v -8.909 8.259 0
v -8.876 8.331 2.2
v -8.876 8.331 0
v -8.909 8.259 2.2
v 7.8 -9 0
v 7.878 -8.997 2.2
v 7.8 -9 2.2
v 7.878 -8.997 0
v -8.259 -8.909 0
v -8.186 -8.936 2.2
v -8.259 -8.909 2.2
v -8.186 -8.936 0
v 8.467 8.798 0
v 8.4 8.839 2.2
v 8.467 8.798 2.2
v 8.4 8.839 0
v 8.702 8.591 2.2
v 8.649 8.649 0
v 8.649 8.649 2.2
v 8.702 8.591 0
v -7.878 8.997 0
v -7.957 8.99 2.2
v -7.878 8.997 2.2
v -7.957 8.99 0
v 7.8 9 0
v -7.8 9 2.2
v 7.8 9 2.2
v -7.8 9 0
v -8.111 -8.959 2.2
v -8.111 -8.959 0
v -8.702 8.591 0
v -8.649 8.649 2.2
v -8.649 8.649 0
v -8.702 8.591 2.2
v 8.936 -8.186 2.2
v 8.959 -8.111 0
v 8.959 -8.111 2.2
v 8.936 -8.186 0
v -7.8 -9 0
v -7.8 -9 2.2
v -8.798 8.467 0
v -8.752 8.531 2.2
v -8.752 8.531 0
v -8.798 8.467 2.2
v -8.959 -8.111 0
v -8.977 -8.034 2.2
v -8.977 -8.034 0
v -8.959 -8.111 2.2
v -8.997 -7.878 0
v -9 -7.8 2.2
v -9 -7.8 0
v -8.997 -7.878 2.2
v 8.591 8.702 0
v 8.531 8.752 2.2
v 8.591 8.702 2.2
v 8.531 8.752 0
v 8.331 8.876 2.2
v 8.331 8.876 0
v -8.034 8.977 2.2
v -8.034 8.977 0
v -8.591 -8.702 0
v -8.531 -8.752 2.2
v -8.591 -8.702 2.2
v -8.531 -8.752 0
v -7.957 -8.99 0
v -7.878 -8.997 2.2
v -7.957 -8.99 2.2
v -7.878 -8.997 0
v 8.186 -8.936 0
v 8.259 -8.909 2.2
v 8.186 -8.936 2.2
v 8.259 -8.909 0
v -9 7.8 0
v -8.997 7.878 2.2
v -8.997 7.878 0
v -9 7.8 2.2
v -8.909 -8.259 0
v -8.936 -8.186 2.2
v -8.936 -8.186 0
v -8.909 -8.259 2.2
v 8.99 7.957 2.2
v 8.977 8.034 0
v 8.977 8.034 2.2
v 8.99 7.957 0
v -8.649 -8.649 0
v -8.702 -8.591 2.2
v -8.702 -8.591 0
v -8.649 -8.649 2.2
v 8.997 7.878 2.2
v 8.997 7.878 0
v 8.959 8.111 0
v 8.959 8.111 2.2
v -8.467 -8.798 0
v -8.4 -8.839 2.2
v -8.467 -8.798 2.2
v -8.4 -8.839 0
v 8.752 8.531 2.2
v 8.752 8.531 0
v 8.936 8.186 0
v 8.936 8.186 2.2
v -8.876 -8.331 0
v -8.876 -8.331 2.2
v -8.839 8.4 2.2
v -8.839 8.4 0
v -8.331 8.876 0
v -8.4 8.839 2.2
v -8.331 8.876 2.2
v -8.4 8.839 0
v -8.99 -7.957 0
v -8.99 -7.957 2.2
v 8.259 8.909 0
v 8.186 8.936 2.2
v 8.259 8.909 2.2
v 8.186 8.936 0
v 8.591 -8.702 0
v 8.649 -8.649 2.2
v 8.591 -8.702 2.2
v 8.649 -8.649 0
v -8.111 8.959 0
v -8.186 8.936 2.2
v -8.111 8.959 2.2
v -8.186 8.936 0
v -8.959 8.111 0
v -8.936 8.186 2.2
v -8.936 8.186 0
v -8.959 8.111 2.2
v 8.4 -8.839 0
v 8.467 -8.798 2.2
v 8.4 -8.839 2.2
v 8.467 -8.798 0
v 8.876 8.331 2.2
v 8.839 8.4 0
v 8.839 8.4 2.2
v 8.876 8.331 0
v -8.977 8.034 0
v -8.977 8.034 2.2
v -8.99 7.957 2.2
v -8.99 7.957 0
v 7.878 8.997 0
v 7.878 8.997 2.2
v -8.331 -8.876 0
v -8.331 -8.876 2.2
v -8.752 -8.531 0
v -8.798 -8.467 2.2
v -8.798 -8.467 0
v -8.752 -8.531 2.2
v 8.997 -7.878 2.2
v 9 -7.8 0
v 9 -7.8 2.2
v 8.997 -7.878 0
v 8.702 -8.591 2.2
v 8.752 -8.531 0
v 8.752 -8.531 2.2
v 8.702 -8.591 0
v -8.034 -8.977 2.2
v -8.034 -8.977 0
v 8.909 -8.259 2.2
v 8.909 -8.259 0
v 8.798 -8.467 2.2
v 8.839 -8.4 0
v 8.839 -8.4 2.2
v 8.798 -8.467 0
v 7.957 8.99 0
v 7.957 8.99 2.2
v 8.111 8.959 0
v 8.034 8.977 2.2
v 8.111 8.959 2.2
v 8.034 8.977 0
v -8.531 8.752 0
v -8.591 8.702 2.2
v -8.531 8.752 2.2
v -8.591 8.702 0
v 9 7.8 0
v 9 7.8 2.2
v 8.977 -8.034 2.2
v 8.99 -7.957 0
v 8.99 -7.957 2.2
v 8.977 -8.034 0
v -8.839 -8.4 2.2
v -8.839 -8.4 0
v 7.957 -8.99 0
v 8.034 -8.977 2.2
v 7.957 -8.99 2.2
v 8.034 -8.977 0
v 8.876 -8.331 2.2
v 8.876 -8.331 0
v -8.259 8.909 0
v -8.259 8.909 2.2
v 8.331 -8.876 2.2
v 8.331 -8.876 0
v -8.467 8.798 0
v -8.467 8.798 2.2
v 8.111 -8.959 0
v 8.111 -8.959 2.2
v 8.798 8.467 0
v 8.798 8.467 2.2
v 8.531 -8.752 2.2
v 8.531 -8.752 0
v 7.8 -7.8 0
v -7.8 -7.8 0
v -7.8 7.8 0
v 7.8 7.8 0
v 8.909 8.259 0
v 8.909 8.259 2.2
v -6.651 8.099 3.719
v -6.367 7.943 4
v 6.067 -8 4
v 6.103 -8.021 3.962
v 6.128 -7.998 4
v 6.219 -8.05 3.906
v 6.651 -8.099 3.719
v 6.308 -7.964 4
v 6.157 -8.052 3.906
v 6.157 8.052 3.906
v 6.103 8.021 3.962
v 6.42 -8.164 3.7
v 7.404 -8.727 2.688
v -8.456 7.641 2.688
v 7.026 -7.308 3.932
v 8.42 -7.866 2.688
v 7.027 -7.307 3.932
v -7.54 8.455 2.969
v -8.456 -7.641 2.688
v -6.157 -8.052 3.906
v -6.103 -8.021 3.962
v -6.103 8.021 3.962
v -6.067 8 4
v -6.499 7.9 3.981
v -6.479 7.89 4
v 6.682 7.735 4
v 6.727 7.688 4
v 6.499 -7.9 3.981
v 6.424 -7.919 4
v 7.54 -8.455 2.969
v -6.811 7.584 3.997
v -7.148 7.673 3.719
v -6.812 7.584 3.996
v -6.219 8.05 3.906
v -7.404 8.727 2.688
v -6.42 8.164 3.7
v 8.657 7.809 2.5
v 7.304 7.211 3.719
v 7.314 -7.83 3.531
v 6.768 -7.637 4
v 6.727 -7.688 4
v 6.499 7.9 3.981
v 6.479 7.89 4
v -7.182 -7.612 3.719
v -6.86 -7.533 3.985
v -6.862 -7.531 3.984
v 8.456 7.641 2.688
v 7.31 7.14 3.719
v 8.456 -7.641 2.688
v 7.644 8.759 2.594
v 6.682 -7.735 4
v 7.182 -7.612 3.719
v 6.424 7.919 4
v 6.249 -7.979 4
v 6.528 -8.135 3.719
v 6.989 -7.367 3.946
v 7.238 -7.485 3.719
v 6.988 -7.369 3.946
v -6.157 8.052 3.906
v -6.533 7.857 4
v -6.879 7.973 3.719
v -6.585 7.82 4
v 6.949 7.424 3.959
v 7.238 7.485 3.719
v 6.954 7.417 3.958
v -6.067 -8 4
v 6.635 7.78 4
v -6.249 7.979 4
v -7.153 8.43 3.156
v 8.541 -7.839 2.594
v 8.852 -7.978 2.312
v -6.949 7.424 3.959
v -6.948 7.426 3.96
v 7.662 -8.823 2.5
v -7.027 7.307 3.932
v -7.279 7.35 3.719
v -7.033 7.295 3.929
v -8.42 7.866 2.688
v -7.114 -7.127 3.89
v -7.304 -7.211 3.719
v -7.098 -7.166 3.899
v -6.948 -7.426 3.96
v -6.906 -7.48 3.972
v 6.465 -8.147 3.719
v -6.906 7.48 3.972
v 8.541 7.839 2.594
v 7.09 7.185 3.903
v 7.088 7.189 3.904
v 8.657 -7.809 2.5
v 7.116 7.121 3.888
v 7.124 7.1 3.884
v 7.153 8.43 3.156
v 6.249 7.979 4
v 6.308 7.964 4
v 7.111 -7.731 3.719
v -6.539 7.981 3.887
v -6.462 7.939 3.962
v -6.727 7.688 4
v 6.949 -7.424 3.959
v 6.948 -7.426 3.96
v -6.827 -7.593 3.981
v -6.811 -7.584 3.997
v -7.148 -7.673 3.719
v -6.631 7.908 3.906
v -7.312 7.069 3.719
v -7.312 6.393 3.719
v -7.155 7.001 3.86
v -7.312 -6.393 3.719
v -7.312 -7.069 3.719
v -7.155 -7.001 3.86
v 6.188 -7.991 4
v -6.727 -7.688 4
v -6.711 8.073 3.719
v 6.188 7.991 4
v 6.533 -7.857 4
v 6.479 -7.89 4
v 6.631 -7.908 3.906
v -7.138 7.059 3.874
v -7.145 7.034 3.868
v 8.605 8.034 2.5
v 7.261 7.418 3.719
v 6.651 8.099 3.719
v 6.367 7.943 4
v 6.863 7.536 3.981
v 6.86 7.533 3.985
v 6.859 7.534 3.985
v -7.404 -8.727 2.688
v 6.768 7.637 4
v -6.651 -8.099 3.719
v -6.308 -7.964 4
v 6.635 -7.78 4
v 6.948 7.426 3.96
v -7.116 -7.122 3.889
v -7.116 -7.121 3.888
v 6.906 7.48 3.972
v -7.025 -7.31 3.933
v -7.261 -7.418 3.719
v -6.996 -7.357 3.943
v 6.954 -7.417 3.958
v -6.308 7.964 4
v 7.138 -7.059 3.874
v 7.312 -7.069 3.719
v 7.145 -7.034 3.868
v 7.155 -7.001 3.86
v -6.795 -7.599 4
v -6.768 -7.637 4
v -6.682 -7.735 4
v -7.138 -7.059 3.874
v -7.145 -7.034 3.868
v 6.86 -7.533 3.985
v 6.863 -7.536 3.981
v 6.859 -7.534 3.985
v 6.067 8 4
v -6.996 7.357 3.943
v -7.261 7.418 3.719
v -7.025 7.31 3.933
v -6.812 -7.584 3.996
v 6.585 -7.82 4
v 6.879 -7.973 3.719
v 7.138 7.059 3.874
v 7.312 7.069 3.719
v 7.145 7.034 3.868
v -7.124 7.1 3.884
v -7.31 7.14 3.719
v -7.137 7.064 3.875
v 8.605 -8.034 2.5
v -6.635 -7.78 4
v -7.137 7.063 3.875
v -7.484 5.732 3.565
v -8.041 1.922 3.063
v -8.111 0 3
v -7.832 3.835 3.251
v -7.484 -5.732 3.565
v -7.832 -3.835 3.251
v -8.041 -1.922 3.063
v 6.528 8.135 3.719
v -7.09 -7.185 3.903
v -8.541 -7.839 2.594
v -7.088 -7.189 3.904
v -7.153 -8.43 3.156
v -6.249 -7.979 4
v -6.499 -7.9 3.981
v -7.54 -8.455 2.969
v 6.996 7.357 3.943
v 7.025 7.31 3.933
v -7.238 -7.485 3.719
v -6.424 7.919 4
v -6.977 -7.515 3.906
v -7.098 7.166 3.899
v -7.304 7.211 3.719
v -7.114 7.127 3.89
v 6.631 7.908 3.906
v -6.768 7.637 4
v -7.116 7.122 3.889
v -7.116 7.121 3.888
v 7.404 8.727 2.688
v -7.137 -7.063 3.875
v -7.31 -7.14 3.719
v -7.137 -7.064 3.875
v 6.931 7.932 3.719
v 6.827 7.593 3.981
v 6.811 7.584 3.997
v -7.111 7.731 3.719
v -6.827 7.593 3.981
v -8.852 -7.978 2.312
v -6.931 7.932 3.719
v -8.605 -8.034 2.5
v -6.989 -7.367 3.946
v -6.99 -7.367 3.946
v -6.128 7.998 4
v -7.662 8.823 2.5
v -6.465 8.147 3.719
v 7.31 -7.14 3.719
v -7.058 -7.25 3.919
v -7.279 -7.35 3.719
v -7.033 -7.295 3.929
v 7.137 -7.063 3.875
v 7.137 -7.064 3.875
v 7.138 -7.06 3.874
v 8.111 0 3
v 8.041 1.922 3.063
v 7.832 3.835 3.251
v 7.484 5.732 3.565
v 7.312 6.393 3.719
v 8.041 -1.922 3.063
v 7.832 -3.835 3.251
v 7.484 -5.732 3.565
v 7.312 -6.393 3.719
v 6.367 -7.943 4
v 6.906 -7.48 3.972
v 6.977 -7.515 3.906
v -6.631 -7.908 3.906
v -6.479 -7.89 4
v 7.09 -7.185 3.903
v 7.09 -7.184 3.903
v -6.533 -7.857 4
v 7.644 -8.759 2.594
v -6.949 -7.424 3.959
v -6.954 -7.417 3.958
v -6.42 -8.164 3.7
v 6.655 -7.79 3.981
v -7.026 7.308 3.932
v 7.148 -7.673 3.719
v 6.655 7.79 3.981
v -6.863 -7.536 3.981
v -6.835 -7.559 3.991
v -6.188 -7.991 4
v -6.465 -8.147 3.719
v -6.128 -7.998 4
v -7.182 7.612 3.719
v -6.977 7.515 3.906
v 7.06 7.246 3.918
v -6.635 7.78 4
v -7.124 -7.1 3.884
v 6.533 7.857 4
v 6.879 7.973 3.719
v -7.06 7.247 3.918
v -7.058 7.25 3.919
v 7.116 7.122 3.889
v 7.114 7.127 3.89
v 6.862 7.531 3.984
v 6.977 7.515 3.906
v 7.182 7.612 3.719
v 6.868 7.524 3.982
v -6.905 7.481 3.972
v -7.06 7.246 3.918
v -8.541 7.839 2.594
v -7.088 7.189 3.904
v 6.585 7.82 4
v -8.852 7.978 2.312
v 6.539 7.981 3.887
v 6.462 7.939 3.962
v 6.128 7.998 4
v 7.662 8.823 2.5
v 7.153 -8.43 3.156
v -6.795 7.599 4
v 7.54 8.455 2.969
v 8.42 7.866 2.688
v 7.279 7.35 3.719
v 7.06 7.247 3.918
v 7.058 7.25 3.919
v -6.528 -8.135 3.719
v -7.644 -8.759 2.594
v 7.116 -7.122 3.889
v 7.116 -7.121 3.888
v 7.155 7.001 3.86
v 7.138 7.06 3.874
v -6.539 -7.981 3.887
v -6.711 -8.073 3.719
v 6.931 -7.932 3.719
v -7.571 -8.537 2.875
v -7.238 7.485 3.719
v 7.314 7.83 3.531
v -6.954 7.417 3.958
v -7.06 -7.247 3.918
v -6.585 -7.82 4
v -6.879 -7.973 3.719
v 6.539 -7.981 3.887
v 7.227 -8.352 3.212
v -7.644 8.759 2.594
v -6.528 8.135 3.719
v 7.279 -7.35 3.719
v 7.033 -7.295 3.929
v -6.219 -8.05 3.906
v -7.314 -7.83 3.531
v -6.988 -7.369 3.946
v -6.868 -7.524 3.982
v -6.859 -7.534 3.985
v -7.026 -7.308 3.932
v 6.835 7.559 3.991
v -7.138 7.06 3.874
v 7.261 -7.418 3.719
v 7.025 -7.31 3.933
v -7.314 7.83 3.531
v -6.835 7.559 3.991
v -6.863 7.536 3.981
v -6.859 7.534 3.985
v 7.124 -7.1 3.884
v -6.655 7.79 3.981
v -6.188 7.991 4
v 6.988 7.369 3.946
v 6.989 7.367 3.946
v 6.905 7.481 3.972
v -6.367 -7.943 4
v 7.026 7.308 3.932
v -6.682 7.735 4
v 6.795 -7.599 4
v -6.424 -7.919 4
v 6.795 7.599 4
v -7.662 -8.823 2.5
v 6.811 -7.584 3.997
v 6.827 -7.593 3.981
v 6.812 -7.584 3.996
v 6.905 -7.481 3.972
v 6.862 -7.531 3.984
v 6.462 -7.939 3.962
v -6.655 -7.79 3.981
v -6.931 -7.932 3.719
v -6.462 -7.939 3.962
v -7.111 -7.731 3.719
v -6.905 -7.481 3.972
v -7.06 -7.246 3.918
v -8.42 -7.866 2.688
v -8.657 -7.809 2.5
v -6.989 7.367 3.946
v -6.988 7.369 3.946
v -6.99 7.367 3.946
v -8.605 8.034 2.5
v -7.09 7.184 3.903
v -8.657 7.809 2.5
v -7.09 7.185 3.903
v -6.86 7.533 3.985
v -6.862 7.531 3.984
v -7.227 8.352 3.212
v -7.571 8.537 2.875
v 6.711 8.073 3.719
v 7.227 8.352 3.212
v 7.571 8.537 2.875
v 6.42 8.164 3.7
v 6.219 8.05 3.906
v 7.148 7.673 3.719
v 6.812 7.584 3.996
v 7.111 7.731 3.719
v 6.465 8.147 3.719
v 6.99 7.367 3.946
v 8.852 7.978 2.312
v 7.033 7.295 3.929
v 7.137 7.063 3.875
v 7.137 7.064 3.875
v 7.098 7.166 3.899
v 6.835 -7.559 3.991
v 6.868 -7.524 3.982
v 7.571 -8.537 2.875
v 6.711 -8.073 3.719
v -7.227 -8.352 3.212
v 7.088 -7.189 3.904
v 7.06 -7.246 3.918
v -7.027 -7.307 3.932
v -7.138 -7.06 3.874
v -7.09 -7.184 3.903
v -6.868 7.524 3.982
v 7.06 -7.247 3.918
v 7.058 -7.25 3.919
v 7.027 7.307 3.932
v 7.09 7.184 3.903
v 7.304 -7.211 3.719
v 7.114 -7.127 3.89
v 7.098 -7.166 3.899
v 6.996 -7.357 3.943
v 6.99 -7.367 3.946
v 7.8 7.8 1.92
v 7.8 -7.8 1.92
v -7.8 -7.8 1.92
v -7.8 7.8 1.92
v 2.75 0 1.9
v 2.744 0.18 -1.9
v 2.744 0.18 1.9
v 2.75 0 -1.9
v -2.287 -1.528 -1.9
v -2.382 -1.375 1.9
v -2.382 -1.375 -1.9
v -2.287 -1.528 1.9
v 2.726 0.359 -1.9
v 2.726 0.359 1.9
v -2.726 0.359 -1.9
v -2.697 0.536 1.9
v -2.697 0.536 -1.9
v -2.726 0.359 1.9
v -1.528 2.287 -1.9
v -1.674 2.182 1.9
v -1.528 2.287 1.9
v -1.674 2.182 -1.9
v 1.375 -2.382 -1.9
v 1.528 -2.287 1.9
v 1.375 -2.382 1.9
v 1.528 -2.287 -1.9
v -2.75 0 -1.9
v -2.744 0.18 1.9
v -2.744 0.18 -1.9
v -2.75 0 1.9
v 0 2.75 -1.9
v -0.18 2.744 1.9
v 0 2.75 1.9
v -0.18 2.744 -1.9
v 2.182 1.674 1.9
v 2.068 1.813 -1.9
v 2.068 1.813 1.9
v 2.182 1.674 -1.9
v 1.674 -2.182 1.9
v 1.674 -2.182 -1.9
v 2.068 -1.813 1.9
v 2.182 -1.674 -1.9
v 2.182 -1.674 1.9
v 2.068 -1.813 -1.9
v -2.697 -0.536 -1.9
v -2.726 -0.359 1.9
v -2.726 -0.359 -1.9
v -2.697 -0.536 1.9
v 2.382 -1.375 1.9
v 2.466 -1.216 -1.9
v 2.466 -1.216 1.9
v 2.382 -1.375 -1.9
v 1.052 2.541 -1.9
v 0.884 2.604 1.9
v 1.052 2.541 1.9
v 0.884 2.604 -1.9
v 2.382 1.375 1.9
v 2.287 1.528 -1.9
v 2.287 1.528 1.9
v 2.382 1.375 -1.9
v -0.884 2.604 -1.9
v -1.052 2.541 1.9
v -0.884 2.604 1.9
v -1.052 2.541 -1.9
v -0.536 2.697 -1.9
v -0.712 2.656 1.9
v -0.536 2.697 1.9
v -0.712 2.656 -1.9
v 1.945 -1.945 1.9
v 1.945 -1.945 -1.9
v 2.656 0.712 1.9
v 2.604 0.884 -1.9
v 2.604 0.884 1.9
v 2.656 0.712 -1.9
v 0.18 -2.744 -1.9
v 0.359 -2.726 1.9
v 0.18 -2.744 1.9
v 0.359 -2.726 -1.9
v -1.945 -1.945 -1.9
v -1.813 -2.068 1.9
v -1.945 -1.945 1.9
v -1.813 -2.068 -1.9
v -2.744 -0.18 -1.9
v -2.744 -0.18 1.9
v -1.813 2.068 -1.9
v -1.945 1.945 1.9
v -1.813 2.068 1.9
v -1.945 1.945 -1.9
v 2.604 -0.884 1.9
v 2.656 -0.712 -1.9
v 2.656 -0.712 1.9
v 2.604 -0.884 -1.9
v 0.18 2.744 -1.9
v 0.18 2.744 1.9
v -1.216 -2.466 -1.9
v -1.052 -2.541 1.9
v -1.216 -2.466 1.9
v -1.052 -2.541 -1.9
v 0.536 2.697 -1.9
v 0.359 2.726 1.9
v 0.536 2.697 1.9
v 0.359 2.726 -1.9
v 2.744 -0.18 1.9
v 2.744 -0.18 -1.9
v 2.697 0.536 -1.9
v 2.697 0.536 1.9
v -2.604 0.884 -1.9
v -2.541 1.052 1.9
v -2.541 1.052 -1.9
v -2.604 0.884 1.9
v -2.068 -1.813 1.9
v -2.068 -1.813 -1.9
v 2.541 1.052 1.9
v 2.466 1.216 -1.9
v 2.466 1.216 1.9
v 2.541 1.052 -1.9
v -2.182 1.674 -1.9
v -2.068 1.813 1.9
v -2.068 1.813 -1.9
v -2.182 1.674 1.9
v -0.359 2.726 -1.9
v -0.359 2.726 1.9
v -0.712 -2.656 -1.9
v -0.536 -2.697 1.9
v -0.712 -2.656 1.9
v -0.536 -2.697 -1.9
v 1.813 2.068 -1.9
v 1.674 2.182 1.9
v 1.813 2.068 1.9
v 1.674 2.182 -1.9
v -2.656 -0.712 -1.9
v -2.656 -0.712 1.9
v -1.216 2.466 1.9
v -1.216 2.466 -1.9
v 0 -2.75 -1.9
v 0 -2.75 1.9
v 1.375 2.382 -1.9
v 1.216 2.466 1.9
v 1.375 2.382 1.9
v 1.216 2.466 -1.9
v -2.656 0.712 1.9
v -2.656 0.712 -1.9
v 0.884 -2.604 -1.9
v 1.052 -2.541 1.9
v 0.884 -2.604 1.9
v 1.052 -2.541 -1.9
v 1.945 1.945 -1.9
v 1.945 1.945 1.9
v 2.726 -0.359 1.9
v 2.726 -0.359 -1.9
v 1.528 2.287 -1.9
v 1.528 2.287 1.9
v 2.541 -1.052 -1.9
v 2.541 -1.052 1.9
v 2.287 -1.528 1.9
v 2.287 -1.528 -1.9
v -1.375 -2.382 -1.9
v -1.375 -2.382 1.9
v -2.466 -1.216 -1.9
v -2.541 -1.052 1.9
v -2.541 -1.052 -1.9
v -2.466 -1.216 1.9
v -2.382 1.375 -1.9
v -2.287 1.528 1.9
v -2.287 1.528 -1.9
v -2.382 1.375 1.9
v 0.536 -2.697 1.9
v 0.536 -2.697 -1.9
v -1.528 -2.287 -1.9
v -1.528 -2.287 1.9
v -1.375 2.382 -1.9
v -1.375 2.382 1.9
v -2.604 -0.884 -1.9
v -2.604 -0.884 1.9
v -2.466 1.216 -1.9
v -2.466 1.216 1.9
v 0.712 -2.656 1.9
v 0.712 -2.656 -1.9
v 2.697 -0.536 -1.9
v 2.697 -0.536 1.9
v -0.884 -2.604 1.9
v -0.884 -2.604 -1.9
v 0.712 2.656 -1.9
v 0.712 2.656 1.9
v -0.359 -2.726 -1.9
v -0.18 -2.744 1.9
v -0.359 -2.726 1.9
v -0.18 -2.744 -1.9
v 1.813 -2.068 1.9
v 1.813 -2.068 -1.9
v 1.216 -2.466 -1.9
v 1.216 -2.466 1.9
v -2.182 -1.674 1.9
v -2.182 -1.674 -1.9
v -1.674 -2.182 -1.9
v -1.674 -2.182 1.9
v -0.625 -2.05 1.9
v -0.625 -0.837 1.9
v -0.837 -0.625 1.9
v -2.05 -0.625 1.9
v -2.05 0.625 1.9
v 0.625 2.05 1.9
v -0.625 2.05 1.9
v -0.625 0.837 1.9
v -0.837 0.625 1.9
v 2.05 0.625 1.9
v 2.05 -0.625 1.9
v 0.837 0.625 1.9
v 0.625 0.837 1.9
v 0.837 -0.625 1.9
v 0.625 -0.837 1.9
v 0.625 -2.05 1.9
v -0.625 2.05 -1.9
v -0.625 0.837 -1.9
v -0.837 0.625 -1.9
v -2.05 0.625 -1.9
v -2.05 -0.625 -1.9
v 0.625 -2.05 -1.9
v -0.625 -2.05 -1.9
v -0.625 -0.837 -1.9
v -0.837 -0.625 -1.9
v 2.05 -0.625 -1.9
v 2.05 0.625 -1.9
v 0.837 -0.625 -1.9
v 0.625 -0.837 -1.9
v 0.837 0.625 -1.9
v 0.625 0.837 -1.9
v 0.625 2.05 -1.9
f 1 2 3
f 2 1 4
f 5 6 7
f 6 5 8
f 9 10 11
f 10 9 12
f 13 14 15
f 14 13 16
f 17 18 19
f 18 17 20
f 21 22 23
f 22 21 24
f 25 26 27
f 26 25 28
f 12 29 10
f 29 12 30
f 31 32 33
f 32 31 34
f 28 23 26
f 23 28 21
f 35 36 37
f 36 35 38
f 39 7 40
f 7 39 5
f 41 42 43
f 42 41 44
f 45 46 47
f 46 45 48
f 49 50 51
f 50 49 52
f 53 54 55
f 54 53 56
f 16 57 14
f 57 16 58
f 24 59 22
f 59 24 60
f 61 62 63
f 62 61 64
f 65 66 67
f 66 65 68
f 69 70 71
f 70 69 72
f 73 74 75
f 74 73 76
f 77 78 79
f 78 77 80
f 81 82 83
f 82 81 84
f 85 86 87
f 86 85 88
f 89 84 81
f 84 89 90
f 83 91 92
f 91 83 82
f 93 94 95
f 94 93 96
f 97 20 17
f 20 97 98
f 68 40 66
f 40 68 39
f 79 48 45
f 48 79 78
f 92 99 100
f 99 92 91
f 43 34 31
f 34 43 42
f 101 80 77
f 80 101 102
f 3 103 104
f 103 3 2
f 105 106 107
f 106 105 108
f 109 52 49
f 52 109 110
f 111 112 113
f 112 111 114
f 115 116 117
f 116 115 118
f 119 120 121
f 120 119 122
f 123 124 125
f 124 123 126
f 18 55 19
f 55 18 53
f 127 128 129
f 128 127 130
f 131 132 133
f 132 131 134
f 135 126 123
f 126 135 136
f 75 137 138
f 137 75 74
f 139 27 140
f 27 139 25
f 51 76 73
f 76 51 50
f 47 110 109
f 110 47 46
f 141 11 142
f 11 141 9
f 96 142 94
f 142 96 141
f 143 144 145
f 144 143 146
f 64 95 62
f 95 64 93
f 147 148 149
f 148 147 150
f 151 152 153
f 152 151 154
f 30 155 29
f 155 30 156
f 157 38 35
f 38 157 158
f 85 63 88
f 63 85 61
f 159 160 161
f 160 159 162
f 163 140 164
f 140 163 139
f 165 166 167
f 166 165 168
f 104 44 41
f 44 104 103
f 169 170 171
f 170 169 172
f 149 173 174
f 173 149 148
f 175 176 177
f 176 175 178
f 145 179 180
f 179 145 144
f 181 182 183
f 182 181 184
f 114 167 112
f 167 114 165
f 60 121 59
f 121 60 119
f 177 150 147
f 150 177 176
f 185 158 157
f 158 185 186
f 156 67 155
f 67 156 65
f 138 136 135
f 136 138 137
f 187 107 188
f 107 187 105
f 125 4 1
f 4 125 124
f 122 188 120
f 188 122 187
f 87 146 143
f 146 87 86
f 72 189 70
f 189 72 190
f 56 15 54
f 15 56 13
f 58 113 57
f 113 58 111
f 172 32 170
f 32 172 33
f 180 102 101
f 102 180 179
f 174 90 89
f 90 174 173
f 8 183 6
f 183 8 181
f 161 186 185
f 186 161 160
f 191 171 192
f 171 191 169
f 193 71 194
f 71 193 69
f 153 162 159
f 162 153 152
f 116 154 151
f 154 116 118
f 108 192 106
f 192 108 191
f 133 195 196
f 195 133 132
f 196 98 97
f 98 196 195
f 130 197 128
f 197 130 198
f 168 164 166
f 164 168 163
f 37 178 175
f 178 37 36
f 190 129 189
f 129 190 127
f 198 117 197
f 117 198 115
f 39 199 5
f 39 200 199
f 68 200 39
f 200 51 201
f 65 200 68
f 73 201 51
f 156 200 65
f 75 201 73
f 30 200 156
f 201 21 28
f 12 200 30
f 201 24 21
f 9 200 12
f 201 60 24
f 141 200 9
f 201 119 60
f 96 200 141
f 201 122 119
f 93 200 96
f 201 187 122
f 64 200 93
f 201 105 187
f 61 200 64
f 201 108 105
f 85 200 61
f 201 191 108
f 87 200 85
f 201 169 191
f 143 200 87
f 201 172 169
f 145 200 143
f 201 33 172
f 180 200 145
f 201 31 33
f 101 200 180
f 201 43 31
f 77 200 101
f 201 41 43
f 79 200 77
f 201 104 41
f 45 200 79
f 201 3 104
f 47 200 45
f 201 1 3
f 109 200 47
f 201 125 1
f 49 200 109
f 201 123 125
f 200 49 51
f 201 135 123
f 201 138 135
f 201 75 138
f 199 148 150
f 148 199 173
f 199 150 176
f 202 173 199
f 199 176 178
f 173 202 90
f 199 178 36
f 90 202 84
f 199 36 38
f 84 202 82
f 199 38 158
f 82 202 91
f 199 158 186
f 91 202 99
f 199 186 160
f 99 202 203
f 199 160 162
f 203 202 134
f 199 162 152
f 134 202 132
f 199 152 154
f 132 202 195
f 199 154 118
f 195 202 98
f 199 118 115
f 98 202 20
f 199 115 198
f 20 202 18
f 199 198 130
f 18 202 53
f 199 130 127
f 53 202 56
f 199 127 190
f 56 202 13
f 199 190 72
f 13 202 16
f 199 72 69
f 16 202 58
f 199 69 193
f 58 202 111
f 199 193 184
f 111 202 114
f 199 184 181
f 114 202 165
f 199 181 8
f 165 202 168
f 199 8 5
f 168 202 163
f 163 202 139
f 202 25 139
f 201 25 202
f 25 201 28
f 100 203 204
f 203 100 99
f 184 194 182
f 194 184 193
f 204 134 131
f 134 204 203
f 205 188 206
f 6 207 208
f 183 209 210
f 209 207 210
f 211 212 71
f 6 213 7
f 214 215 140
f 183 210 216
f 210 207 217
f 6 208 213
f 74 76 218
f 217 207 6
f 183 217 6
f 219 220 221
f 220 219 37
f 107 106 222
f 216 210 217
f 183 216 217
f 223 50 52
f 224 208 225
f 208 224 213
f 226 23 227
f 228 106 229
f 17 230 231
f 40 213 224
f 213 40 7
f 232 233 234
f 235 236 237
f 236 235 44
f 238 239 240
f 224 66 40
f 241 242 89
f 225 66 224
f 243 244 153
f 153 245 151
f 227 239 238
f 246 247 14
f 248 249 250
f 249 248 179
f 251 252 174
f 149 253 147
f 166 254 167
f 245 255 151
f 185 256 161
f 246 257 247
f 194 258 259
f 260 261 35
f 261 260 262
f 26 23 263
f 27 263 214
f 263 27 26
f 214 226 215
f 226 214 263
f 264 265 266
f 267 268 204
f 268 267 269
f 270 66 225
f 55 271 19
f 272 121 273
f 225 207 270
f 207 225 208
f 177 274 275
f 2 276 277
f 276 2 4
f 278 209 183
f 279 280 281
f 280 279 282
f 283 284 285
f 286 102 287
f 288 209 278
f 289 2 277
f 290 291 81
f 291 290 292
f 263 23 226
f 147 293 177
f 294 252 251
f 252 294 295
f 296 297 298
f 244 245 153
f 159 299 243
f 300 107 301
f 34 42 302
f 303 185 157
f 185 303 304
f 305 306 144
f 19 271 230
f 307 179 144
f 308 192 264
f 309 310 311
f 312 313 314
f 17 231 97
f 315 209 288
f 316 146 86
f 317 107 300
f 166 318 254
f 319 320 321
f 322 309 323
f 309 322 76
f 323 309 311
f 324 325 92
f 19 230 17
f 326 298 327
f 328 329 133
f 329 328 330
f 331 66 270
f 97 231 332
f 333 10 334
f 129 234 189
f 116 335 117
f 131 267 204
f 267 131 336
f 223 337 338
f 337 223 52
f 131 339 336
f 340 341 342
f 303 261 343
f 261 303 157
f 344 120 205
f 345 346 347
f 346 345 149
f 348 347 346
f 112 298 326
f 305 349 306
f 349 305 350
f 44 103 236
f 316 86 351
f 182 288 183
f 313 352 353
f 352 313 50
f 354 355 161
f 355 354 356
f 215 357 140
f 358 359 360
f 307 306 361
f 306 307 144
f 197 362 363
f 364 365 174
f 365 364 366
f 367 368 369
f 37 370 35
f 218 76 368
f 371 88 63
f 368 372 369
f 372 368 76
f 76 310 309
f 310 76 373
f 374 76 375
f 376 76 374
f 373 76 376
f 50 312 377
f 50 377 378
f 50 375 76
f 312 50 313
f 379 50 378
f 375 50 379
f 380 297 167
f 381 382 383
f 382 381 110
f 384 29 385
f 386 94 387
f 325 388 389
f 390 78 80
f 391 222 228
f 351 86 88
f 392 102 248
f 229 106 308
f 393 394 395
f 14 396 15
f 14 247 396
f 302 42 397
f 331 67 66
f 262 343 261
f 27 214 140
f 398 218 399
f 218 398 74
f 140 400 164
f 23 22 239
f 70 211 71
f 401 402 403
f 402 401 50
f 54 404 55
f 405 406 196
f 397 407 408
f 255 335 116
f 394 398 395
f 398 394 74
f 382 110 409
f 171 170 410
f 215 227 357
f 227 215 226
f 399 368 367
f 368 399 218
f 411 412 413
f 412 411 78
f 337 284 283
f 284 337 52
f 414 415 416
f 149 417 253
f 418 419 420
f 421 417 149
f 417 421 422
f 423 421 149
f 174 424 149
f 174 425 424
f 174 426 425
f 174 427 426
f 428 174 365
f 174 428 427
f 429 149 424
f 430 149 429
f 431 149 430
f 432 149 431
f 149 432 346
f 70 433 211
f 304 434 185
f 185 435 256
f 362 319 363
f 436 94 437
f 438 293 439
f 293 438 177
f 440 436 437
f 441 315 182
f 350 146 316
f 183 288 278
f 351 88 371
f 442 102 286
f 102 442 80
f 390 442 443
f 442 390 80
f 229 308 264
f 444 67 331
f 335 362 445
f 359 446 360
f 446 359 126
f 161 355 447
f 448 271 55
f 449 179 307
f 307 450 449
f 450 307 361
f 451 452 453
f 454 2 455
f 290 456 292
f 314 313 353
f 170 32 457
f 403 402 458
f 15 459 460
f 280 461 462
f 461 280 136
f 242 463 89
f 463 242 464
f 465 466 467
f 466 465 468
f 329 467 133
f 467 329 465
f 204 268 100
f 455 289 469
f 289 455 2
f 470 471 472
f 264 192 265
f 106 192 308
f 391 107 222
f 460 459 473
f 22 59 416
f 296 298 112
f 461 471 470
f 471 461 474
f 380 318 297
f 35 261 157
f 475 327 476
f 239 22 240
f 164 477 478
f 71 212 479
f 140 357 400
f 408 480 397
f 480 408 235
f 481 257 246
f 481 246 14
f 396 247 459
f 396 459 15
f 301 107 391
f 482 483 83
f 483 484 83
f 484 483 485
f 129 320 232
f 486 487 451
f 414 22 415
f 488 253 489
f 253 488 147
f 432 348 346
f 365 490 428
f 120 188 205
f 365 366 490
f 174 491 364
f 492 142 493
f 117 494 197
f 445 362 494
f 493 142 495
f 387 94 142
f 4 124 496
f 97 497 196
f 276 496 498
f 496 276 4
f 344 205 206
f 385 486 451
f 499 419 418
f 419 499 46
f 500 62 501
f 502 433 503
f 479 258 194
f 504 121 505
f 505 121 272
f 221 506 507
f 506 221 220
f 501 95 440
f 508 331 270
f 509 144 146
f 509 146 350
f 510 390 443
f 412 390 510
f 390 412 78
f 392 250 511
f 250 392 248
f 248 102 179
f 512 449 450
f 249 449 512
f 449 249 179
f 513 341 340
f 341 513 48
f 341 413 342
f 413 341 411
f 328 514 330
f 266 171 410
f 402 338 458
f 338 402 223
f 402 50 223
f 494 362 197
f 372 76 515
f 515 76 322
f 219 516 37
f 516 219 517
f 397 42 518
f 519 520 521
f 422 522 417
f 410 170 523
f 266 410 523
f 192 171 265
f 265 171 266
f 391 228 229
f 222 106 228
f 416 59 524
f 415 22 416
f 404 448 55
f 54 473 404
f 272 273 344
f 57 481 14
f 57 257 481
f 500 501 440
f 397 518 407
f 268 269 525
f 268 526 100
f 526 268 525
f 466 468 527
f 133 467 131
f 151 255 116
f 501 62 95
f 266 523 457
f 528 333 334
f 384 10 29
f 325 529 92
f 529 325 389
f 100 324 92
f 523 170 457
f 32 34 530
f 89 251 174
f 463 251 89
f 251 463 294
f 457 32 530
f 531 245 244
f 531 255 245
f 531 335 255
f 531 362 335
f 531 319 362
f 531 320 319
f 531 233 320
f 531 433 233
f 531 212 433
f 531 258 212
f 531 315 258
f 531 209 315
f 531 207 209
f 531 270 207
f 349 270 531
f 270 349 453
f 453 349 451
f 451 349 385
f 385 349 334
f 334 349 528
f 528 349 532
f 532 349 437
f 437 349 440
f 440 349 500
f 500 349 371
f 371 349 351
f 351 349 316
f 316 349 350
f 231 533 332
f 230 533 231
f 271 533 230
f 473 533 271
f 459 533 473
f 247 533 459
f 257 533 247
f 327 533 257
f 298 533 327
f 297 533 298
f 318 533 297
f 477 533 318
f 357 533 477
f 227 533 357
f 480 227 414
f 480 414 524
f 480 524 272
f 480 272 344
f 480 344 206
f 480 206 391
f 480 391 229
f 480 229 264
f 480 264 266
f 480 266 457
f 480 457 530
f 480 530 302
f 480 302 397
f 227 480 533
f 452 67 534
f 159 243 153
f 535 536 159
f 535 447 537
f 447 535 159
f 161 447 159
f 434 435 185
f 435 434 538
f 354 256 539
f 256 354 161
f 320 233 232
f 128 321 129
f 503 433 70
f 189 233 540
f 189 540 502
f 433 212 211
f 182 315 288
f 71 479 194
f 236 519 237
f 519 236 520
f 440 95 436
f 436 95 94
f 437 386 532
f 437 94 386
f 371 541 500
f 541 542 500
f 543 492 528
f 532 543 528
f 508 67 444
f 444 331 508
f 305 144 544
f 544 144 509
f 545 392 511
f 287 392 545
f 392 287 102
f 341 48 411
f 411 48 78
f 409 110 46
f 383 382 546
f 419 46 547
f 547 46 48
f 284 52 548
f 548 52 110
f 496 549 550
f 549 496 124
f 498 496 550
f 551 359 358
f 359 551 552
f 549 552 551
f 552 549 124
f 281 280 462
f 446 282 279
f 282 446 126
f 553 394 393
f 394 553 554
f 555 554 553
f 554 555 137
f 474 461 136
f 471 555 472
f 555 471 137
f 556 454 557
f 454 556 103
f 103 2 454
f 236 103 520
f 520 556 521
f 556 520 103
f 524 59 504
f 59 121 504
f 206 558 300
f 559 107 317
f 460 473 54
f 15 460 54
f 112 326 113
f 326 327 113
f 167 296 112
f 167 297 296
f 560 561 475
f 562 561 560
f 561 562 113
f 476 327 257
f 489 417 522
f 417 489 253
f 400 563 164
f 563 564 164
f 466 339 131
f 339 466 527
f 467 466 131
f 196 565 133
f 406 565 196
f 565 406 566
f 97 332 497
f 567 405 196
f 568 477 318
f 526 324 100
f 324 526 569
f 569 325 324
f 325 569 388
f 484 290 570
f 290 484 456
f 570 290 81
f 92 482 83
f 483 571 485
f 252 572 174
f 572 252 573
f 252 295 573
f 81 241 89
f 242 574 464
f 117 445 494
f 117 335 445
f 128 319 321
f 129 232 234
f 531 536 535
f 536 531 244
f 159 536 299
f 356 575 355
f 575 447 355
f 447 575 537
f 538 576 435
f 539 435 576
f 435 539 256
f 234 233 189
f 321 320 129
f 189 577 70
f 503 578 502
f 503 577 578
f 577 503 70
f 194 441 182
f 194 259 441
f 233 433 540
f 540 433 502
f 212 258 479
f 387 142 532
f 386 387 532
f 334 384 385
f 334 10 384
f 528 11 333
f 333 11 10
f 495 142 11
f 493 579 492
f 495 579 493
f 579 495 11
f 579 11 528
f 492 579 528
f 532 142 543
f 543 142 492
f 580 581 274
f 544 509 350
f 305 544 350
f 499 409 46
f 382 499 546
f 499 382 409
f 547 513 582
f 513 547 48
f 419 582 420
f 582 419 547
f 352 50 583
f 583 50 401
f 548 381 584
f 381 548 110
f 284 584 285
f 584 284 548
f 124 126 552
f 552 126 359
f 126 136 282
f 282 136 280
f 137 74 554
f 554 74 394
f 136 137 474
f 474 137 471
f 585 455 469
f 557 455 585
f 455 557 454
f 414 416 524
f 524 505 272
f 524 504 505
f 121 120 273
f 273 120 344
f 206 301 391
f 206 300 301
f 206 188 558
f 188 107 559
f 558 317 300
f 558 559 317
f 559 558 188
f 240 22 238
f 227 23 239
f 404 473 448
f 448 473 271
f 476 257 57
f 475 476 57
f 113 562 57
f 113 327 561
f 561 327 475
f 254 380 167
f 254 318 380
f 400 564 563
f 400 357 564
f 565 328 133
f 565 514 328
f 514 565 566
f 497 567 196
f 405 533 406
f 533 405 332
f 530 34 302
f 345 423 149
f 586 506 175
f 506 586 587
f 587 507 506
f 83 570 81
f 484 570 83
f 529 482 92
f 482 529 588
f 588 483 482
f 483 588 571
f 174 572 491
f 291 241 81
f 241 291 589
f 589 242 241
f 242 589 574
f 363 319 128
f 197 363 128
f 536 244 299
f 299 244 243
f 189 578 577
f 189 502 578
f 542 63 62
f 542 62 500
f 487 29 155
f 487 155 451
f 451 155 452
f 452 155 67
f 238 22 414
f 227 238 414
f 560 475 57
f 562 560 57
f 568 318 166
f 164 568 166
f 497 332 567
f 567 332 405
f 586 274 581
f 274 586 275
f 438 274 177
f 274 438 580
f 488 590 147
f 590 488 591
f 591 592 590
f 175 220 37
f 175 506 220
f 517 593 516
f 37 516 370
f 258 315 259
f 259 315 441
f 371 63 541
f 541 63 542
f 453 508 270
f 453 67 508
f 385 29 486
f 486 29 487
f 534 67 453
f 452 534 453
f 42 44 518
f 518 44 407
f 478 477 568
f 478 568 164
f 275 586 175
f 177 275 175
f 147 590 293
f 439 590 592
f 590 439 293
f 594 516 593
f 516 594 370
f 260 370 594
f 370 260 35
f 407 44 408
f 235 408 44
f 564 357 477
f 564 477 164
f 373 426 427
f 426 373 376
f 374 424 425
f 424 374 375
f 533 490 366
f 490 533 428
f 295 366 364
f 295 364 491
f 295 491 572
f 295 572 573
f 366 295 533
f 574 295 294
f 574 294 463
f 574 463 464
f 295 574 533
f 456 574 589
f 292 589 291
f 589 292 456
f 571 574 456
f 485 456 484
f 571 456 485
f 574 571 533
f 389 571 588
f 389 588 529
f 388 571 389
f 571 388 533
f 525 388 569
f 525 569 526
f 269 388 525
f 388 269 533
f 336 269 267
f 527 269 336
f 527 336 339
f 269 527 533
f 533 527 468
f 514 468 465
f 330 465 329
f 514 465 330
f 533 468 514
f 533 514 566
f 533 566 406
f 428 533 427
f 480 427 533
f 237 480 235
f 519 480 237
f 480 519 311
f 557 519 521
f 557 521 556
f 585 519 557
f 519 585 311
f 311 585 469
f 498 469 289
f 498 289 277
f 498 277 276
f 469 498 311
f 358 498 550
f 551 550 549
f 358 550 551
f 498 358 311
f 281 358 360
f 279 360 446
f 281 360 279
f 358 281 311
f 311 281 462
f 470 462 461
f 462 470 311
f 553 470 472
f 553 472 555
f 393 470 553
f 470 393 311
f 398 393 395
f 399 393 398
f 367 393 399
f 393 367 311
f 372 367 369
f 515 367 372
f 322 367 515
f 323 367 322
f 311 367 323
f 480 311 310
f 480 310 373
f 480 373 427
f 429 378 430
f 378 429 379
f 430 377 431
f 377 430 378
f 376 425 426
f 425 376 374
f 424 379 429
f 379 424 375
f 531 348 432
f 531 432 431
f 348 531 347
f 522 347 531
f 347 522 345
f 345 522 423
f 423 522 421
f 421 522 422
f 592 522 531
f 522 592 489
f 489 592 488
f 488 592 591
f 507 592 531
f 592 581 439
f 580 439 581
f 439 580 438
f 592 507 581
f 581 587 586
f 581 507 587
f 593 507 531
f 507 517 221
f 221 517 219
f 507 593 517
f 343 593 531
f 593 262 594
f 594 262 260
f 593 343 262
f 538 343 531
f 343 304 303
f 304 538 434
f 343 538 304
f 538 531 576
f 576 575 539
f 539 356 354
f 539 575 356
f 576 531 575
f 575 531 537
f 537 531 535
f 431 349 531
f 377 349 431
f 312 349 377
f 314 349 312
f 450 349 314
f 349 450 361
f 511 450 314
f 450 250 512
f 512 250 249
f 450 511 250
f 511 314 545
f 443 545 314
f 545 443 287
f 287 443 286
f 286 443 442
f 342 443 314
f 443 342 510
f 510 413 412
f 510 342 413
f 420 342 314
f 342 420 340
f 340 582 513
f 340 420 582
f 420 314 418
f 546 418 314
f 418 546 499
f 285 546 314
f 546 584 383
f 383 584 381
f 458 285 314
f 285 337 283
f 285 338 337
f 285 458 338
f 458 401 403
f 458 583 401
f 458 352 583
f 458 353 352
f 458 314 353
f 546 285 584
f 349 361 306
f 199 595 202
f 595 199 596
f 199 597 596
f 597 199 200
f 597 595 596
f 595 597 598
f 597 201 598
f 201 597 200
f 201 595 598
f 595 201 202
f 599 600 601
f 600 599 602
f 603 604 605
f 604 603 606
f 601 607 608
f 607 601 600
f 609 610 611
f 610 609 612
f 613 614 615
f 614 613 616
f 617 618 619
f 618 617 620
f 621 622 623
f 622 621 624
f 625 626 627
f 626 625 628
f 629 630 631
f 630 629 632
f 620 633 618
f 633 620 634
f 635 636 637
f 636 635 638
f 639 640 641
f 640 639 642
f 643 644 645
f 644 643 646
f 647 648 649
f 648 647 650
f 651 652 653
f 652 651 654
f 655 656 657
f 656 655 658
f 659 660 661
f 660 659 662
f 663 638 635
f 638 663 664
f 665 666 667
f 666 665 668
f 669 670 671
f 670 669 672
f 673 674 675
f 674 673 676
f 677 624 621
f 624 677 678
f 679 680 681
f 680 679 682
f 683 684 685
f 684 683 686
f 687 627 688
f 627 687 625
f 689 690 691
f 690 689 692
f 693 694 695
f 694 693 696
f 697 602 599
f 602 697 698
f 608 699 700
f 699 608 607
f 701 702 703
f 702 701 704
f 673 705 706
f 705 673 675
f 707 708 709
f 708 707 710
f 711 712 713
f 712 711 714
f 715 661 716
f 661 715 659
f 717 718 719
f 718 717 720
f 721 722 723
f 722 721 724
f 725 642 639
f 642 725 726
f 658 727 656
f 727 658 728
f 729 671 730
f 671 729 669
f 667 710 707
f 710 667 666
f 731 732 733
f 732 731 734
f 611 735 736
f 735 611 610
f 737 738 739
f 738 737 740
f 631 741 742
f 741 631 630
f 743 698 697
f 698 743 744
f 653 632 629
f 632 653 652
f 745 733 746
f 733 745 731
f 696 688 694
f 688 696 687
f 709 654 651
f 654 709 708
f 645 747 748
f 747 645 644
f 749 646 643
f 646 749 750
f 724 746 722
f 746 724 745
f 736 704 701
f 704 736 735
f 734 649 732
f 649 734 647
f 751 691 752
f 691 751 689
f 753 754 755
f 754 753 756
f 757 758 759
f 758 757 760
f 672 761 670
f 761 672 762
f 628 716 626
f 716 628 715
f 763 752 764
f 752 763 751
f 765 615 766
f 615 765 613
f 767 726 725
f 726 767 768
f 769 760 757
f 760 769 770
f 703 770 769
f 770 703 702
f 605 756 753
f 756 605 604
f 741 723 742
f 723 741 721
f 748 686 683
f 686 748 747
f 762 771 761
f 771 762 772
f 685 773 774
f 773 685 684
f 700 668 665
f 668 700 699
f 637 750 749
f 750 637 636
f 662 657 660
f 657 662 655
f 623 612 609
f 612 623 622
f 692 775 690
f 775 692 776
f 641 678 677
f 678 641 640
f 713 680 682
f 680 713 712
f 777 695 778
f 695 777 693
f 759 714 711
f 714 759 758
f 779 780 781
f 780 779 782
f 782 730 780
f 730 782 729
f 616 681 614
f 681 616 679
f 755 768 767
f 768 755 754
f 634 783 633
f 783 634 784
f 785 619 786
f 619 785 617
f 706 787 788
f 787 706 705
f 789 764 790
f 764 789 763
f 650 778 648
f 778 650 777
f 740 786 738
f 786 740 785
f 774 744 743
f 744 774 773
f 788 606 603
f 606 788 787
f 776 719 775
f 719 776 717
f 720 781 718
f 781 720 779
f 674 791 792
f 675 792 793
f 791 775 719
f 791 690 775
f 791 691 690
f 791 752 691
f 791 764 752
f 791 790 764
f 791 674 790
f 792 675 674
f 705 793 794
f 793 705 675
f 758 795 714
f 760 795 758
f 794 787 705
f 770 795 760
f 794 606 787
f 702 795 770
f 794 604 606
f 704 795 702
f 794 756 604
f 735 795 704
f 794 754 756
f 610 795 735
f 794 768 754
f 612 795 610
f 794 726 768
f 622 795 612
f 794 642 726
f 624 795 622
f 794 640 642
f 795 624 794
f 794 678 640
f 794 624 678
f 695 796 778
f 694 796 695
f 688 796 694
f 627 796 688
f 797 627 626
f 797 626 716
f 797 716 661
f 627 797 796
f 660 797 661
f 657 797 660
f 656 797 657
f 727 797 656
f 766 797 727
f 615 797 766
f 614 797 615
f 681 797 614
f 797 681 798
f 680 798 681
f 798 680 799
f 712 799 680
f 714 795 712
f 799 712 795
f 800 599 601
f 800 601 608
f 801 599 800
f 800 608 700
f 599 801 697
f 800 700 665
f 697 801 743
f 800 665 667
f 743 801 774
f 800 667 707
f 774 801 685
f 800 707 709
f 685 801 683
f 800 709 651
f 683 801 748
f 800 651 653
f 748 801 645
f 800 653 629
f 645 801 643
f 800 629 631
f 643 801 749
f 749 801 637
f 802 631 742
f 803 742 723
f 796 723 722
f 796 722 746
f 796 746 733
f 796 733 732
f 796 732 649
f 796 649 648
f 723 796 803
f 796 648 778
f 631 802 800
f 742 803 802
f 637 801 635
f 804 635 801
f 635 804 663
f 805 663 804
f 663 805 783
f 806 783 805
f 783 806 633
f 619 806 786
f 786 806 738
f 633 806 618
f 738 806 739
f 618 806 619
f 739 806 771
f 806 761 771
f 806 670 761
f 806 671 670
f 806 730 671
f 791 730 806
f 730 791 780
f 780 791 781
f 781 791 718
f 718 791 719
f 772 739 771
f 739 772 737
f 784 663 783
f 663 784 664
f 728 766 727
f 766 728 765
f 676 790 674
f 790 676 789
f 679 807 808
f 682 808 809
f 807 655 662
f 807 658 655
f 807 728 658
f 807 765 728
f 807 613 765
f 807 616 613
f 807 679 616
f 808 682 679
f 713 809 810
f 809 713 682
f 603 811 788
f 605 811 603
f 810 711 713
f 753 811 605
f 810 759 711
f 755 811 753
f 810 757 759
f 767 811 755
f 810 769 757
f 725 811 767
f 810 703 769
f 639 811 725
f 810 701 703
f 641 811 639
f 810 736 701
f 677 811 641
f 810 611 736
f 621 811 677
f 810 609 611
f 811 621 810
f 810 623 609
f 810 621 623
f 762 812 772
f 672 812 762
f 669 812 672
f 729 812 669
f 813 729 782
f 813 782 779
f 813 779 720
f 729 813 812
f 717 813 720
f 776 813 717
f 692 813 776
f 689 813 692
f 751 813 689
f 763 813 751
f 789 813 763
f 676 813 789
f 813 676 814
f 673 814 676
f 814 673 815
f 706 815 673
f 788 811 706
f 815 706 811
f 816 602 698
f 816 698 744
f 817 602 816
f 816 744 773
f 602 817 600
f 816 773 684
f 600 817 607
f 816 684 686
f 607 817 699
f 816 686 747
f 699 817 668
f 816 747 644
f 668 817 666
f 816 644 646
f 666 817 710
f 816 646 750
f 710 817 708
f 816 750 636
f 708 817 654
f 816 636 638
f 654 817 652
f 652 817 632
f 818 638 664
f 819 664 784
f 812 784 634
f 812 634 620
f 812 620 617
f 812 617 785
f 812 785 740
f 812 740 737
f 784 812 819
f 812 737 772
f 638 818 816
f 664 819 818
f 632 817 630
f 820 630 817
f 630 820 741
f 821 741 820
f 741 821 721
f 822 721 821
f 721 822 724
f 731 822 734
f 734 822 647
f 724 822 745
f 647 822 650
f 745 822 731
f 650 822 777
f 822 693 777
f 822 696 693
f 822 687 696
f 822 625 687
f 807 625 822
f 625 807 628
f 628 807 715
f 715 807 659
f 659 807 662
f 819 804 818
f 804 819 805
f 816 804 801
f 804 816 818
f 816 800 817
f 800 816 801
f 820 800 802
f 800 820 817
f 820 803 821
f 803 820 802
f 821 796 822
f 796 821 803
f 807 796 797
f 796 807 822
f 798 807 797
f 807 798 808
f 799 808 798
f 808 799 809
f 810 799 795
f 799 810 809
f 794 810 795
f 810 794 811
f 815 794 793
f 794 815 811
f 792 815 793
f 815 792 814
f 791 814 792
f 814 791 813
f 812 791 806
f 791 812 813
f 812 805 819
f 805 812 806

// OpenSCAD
/*
  Low profile Keycap for MX stems inspired by the ZSA Voyager and Taihao THTs.
  Units: mm

  This has been tested with an FDM 3D-Printer (Bambulab A1 mini) with PLA Matte.
  Requires no supports if you print with a brim and place it on one of its fillets 
  (at an angle)
  0.12mm layer-height (incl. initial layer).

  Notes / modeling choices:
  - Outer body is a two-stage extrusion: straight walls up to `side_fillet_start_z`,
    then a gentle taper toward the top “inset” footprint.
  - The “touch surface” concavity is approximated by subtracting a cylinder-shaped dish,
    with ~`dish_depth` sag at the center.
  - MX cross hole is a 2D plus that gets filleted using offset(r) then offset(-r)
*/

$fn = 96;

// -------------------------
// Parameters (grouped)
// -------------------------
/* Keycap footprint */
cap_w            = 18;     // X (use different values for oblong)
cap_h            = 18;     // Y
cap_corner_r     = 1.2;    // outer corner radius

/* Vertical dimensions */
cap_thickness        = 4.0;   // total height of cap body (cap bottom to top exterior)
wall_thickness       = 1.2;   // keycap underside cavity walls
underside_pocket_z   = 1.9;   // cavity depth from bottom (inside hollow depth)
side_fillet_start_z  = 2.2;   // z where outer “inset/taper” begins

/* Top inset / touch surface shaping */
inset_lr         = 2.0;   // inset on left/right at the very top (X border)
inset_tb_top     = 1.0;   // inset on top/bottom at the very top (Y border) (your 2mm->1mm feel)
dish_depth       = 1.0;   // concavity depth at center (approx)
dish_span_scale  = 0.95;  // how wide the dish influences (0..1), smaller = more localized

/* Stem (outer post) */
stem_outer_d     = 5.5;   // outer cylinder diameter
stem_total_len   = 3.8;   // total stem length up to the internal “roof” it attaches to
stem_protrude    = 1.9;   // how much stem sticks out below the keycap bottom (also equals pocket depth)

/* MX cross hole - these values are not to spec, but rather to print nicely. */
mx_plus_size     = 4.1;   // overall height/width of plus (across opposite ends)
mx_leg_thick     = 1.25;  // thickness of each leg
mx_inner_fillet  = 0.3;   // fillet radius for inside corners

/* Homing indicator (optional) */
enable_homing    = false;   // set true for F/J
homing_len       = 5.0;    // bar length (X)
homing_w         = 0.7;    // bar width (Y)
homing_h         = 0.5;    // bar height (Z)
homing_offset_y  = -2;     // move bump toward you (negative Y) like typical F/J
homing_offset_z  = 1.001;  // move bump into/away from the keycap

// -------------------------
// Helpers
// -------------------------
module rounded_rect_2d(w, h, r) {
  r2 = min(r, min(w,h)/2);
  offset(r=r2) square([w-2*r2, h-2*r2], center=true);
}

module mx_plus_2d(size, leg, fillet_r) {
  // Sharp plus first
  union() {
    union() {
      square([leg, size], center=true);
      square([size, leg], center=true);
    }

    // Add material only in the 4 re-entrant (inside) corners
    // (these are at ±leg/2, ±leg/2). This won’t touch the 8 outer corners.
    for (sx = [-1, 1], sy = [-1, 1]) {
      translate([sx*leg/2, sy*leg/2]) 
        rotate([0,0,45])
          square(fillet_r, center=true);
    }
  }
}


// capsule-ish bar for homing (2D), then extrude
module capsule_2d(len, w) {
  // hull of two circles to make a capsule
  hull() {
    translate([-(len/2 - w/2), 0]) circle(d=w);
    translate([ +(len/2 - w/2), 0]) circle(d=w);
  }
}

// -------------------------
// Main model
// -------------------------
module keycap_body() {
  // bottom footprint
  base_w = cap_w;
  base_h = cap_h;

  // top footprint (inset)
  top_w  = max(0.1, cap_w - 2*inset_lr);
  top_h  = max(0.1, cap_h - 2*inset_tb_top);

  // scale factors for the upper taper
  sx = top_w / base_w;
  sy = top_h / base_h;

  lower_h = min(side_fillet_start_z, cap_thickness);
  upper_h = max(0, cap_thickness - lower_h);

  union() {
    // lower straight section
    linear_extrude(height=lower_h)
      rounded_rect_2d(base_w, base_h, cap_corner_r);

    // upper tapered section
    if (upper_h > 0.0001)
      translate([0,0,lower_h])
        linear_extrude(height=upper_h, scale=[sx, sy])
          rounded_rect_2d(base_w, base_h, cap_corner_r);
  }
}

module underside_pocket() {
  // cavity is a rounded rectangle inset by wall thickness
  inner_w = cap_w - 2*wall_thickness;
  inner_h = cap_h - 2*wall_thickness;
  inner_r = max(0, cap_corner_r - wall_thickness);

  // pocket cut from the bottom upward
  translate([0,0,0])
    linear_extrude(height=underside_pocket_z + 0.02)  // tiny extra to avoid z-fighting
      rounded_rect_2d(inner_w, inner_h, inner_r);
}

// concave dish made with a cylinder (axis along X)
module concave_dish_cut() {
  // cylinder gives curvature in Y, leaving X mostly "flat" — matches your 2mm LR / curved TB feel.
  top_h = max(0.1, cap_h - 2*inset_tb_top);

  a = dish_span_scale * top_h / 2; // half-chord in Y
  h = dish_depth;                  // sagitta (depth)

  // R = (a^2 + h^2)/(2h)
  R = (a*a + h*h) / (2*h);

  // place cylinder so that it cuts depth ~h at center on the top surface.
  // for a cylinder, the surface at y=0 sits at z = zc - R, so set that to cap_thickness - h.
  zc = (cap_thickness - h) + R;

  intersection() {
    translate([0,0,zc])
      rotate([0,90,0])  // axis along X
        cylinder(r=R, h=cap_w*3, center=true);

    // bounding box around the top region
    translate([0,0,cap_thickness - 3*h])
      cube([cap_w*2, cap_h*2, 6*h], center=true);
  }
}


// stem placement and extrude it to connect to keycap hull
module stem_post_with_mx_hole() {
  // force stem top to meet the "roof" (top of the underside pocket) at z = underside_pocket_z
  z1 = underside_pocket_z;
  z0 = z1 - stem_total_len;

  difference() {
    translate([0,0,z0])
      cylinder(d=stem_outer_d, h=stem_total_len);

    translate([0,0,z0 - 0.2])
      linear_extrude(height=stem_total_len + 0.4)
        mx_plus_2d(mx_plus_size, mx_leg_thick, mx_inner_fillet);
  }
}


module homing_bump() {
  if (enable_homing) {
    // put it on the top surface, slightly sunk into the dish cut region.
    translate([0, homing_offset_y, cap_thickness - homing_offset_z])
      linear_extrude(height=homing_h)
        capsule_2d(homing_len, homing_w);
  }
}

module low_profile_xm_keycap() {
    union() {
      difference() {
        // main cap shell (solid, then we hollow it)
        keycap_body();
        
        // underside hollow pocket
        underside_pocket();

        // concave touch dish (top shaping)
        concave_dish_cut();
      }
      // stem post attached to the inside roof (top of pocket)
      stem_post_with_mx_hole();

      // optional homing bump 
      homing_bump();
    }
  
}

// -------------------------
// Render
// -------------------------
low_profile_xm_keycap();
